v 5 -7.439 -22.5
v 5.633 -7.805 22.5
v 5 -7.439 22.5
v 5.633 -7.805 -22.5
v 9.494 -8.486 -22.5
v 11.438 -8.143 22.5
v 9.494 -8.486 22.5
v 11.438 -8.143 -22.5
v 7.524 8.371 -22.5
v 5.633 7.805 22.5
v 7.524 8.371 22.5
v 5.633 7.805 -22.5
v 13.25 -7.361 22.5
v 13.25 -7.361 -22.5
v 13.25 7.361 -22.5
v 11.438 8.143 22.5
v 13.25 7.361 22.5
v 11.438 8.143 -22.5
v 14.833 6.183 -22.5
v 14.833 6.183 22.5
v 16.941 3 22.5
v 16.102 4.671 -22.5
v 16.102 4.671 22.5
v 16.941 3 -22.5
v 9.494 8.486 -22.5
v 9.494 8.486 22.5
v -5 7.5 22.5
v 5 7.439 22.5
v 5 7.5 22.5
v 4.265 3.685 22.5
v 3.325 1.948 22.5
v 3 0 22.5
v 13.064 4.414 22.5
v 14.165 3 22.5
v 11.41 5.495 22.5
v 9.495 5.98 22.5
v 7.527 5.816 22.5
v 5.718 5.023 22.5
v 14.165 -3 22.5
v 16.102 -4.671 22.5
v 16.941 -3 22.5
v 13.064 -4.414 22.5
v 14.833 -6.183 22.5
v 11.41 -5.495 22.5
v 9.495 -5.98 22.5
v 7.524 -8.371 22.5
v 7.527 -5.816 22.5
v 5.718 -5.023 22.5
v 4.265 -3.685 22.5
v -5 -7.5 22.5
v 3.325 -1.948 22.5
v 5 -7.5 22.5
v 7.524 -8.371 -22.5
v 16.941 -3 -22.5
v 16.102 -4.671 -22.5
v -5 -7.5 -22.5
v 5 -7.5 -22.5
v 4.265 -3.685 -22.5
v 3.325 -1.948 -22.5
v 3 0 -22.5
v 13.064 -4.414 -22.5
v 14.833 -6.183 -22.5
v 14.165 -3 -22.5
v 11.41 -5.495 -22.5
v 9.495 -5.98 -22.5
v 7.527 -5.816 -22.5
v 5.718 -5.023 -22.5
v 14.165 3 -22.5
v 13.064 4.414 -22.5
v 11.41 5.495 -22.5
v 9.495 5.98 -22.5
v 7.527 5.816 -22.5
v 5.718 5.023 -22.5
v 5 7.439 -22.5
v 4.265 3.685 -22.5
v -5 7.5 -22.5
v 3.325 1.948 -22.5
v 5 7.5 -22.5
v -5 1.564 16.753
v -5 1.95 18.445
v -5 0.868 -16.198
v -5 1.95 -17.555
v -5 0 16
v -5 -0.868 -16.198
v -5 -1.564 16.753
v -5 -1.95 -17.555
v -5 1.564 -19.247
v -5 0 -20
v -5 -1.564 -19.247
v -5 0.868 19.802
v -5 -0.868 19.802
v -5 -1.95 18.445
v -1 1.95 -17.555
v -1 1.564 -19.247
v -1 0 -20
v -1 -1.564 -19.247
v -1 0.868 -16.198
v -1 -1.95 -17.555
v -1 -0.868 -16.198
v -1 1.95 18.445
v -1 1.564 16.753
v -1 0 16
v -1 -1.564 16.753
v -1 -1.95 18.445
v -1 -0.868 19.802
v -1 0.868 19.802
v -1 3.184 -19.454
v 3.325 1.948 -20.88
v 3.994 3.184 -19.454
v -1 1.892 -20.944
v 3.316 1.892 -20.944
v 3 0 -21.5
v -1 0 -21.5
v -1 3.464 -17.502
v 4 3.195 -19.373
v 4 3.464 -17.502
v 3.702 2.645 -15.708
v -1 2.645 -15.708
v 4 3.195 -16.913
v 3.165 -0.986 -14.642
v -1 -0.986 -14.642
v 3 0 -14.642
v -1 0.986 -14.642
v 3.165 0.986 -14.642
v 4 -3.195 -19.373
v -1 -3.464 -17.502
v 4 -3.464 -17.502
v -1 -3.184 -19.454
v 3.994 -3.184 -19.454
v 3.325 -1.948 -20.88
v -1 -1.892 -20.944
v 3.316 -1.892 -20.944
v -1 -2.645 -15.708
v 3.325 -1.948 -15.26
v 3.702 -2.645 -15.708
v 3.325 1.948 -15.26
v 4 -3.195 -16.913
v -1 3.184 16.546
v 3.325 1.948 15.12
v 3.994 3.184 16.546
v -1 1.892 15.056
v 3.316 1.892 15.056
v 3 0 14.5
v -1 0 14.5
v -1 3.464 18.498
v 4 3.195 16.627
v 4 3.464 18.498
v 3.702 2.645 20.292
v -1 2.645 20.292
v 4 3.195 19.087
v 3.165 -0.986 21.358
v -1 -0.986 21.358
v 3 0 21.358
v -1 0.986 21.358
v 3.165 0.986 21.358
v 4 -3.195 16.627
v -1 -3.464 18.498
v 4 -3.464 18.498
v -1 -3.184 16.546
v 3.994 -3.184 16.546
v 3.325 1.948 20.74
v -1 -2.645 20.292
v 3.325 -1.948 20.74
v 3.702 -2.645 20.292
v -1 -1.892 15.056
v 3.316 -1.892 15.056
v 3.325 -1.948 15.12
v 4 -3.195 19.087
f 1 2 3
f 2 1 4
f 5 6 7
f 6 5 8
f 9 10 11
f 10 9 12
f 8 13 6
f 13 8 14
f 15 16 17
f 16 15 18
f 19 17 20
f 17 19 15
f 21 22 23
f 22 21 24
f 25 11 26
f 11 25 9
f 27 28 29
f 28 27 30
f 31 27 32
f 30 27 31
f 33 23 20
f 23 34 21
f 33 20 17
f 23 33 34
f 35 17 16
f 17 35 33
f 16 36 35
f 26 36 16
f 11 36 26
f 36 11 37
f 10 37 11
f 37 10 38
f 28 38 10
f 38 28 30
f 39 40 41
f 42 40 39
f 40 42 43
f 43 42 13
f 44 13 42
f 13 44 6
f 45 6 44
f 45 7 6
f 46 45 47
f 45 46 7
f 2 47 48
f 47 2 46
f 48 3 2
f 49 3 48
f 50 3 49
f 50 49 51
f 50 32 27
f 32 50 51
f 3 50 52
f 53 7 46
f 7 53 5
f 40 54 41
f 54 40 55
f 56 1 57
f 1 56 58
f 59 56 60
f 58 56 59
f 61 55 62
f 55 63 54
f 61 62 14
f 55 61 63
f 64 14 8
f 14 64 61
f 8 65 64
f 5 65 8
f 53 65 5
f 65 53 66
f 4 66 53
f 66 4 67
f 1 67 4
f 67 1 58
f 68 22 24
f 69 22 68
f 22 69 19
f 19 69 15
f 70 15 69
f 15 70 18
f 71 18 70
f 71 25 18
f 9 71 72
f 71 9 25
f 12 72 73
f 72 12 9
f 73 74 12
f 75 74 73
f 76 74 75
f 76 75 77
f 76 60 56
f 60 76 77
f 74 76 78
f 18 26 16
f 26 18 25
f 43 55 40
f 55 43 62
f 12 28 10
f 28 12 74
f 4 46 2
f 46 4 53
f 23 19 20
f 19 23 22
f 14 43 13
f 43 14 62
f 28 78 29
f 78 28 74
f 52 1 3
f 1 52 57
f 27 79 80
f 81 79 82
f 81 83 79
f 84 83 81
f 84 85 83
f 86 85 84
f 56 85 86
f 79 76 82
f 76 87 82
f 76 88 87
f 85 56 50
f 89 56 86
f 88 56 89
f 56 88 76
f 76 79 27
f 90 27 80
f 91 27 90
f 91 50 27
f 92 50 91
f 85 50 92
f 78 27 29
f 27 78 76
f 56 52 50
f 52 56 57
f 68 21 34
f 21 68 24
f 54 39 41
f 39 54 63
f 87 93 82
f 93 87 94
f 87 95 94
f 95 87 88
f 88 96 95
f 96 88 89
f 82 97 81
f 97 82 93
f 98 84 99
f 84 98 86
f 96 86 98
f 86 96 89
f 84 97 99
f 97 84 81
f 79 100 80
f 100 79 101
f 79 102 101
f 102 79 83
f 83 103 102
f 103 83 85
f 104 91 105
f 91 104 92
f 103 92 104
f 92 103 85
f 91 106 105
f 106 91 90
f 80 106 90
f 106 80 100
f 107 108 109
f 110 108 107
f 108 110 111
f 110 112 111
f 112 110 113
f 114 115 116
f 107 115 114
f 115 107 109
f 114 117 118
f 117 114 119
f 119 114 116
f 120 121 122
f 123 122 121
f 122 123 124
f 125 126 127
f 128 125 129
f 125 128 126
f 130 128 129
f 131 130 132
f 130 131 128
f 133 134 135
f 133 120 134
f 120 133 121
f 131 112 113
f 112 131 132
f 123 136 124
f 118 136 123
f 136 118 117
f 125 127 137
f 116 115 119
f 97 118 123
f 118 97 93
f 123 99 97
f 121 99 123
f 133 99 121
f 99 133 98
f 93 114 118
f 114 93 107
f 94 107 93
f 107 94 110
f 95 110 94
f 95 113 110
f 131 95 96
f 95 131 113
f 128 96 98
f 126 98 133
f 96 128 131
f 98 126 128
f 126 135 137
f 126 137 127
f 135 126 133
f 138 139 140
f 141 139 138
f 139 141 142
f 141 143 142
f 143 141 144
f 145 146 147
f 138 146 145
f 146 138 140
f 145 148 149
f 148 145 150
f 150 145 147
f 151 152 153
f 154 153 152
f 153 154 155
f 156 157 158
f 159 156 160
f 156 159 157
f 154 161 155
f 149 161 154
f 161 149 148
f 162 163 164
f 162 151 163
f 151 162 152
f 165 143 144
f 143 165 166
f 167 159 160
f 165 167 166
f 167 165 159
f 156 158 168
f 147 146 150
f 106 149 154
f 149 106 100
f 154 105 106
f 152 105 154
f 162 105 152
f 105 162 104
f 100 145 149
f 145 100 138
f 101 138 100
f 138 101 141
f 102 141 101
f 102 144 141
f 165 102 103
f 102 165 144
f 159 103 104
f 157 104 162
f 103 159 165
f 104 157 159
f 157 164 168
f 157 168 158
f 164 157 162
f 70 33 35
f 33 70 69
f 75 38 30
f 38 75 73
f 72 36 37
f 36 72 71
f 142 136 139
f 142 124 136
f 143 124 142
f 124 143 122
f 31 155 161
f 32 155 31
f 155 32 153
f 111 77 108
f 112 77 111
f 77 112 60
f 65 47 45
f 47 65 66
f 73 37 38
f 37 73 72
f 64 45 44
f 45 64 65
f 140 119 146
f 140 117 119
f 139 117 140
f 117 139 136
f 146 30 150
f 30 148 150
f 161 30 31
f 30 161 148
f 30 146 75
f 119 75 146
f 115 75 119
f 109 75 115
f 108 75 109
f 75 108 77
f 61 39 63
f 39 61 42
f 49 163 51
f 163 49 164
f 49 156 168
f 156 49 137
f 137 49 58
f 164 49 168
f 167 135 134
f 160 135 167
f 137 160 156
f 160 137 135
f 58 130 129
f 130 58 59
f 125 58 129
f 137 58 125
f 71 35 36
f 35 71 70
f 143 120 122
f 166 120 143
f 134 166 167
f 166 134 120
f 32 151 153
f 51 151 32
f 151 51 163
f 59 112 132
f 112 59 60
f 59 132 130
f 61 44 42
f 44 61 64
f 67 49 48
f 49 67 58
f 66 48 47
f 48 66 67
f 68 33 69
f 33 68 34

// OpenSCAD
// file: Rook_Config.scad
// Rook 3D Printer Configuration
// Created By Jeffrey Olijar 
// Jolijar@gmail.com

// Layer Height
LH = 0.38;

// 608 skate bearing
Bearing_OD = 22.5; 
Bearing_ID = 8;
Bearing_H = 7;

// M3 Nut Diameter
N3 = 7.5;

// M4 Screw Hole Diameter
M4 = 4;

// M5 Screw Hole Diameter
M5 = 5.4;

// M8 Rod Diameter (configure for a tight fit)
M8 = 8.2;

// M8 Nut Diameter
N8 = 15.5;

//LM8UU Bearing
LBD = 15.4; // Diameter
LBH = 25; // Height
LBI = 8;  // Inner Diameter

//Makergear Groovemount
GVO = 16.5; // Outside Diameter
GVI = 12.5;  // Inside Groove Diameter

// Distance Between Centers for X rods
DBCX = 70;
// main file
// Rook 3D Printer 
// Sharpie Holder
// Created By Jeffrey Olijar 
// Jolijar@gmail.com
// Revision 1.00


include <Rook_Config.scad> 



module Rook_Sharpie(){




rotate(a=[0,90,0]){

difference(){ 

union(){
rotate(a=[0,90,0])translate(v=[-9,0,0]){ 
cylinder(h=45,r=17/2, center = true);
}
translate(v=[0,0,0]){ 
cube(size = [45,15,10], center = true);
}
}

union(){

translate(v=[0,0,20]){ 
cube(size = [46,6,15], center = true);
}
rotate(a=[0,0,0])translate(v=[18,0,0]){ 
cylinder(h=100,r=M4/2, center = true);
}
rotate(a=[0,0,0])translate(v=[-18,0,0]){ 
cylinder(h=100,r=M4/2, center = true);
}
rotate(a=[0,0,0])translate(v=[18,0,1.5]){ 
cylinder(h=5,r=7/2, center = true);
}
rotate(a=[0,0,0])translate(v=[-18,0,1.5]){ 
cylinder(h=5,r=7/2, center = true);
}

rotate(a=[0,90,0])translate(v=[-9,0,0]){ 
cylinder(h=125,r=12/2, center = true);
}




}}

}


}




Rook_Sharpie();
